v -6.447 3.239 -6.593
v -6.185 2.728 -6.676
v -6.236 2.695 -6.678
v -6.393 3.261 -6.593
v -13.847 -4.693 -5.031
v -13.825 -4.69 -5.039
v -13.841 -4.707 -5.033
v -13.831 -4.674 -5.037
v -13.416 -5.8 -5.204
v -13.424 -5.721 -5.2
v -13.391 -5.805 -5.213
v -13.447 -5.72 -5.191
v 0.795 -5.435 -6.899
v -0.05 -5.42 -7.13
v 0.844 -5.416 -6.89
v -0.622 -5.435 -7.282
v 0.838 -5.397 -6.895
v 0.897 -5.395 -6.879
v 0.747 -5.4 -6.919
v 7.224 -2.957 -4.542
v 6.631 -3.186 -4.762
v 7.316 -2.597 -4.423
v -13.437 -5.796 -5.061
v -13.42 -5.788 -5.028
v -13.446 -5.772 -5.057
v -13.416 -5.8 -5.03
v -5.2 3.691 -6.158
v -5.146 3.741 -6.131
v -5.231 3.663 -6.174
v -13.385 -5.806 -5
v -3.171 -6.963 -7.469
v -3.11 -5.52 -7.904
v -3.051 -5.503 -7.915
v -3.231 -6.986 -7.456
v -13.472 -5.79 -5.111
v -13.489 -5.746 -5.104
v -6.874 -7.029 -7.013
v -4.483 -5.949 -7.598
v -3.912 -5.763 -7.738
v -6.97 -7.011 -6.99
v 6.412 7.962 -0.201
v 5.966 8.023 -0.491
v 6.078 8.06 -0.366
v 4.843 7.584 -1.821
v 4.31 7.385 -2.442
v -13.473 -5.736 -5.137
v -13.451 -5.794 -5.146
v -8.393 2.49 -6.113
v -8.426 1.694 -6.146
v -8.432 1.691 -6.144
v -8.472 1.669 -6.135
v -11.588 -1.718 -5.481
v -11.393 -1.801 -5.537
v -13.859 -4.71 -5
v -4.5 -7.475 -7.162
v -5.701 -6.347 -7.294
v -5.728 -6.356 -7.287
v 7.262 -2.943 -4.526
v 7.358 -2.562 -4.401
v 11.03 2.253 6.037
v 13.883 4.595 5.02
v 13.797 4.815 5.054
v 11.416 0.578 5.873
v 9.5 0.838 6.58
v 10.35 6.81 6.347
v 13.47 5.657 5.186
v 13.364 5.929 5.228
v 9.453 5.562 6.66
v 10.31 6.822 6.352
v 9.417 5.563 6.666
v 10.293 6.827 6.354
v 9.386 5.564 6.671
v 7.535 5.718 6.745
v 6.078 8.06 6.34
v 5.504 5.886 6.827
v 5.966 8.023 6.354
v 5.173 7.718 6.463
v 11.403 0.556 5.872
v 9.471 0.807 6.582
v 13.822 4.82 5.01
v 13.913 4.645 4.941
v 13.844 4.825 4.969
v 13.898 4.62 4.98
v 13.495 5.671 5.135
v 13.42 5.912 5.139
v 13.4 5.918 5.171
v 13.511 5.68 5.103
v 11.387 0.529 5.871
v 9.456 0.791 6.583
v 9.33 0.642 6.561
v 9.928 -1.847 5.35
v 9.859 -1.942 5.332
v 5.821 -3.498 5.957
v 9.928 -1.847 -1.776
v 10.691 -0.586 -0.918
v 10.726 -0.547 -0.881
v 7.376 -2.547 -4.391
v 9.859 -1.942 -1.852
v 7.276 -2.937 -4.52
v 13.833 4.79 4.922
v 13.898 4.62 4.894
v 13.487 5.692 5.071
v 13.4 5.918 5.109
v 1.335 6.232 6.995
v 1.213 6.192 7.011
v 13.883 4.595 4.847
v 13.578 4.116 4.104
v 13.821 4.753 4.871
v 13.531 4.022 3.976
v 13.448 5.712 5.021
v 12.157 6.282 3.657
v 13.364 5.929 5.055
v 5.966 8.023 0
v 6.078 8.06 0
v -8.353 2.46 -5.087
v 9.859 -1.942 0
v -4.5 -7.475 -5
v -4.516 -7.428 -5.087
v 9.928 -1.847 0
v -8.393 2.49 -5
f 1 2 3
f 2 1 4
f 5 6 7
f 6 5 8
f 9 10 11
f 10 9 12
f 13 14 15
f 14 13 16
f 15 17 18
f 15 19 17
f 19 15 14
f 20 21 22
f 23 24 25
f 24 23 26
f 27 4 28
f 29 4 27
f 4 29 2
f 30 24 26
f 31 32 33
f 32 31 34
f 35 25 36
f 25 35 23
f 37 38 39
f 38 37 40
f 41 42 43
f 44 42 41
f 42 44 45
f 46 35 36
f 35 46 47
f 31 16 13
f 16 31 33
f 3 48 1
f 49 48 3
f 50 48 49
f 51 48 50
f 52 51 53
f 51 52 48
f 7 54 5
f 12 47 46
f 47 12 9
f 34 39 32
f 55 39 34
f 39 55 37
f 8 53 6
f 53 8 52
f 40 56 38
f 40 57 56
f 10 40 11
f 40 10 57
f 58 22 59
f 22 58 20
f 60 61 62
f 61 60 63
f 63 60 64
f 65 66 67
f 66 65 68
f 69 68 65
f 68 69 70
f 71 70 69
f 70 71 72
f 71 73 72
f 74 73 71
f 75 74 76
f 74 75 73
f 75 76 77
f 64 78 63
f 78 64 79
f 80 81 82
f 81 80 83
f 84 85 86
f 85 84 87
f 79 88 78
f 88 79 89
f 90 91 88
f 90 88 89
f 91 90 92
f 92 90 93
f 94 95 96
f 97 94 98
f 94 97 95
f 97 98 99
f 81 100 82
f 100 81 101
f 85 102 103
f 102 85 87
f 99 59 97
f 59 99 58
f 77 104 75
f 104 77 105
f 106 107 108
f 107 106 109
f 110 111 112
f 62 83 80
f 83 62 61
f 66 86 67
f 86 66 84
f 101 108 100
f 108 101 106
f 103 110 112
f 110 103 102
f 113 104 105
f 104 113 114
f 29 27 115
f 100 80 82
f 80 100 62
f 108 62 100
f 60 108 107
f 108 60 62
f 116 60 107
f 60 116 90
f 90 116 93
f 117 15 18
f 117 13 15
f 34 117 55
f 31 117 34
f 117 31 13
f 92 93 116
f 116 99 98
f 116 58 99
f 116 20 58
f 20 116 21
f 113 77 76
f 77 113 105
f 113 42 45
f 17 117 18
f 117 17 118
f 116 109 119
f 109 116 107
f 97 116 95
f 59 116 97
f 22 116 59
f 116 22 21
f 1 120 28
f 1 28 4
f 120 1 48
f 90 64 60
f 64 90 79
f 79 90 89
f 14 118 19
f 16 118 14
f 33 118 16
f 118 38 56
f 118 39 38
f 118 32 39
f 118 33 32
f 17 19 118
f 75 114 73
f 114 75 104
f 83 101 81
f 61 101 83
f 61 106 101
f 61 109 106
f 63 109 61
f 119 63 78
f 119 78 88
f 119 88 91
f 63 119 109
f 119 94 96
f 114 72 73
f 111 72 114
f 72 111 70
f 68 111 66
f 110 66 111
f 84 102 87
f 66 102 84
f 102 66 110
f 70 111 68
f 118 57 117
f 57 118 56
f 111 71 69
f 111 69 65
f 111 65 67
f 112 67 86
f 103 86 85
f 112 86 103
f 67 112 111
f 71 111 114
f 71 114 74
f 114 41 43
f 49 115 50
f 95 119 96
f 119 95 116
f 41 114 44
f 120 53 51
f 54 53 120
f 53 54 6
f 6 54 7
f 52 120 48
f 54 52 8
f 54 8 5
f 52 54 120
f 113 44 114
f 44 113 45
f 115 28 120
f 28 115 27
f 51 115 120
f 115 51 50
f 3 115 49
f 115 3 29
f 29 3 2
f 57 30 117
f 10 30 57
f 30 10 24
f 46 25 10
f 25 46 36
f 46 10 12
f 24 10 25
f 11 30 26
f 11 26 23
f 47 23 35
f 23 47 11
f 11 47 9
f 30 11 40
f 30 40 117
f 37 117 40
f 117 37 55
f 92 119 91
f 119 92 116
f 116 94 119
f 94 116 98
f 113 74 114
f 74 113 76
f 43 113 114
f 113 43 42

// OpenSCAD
// Auto-generated OpenSCAD file

    inner_points = 10*[[1.4359011870482463, 0.5533730837177137, -0.5000000000000805], [-1.4359011870482463, -0.5533730837177137, 0.5000000000000805], [0.8874357380822848, 0.34200337419673843, 1.3090169943748977], [1.483420692140161e-13, -1.4966410443445797e-13, 1.618033988749895], [-1.483420692140161e-13, 1.4966410443445797e-13, -1.618033988749895], [-0.8874357380822848, -0.34200337419673843, -1.3090169943748977], [1.4359011870483378, 0.5533730837176212, 0.4999999999999195], [-0.887435738082045, -0.3420033741969806, 1.3090169943749972], [0.887435738082045, 0.3420033741969806, -1.3090169943749972], [-1.4359011870483378, -0.5533730837176212, -0.4999999999999195], [0.05622638989055023, 0.5850898186537883, 0.8090169943749964], [0.434336020988879, -0.39603500310477363, 0.809016994374871], [0.6046918388566034, 0.7964595281746711, 1.8207657603852567e-14], [0.9828014699549321, -0.18466529358389083, -1.0721978860317449e-13], [-0.8312093481916429, 0.2430864444569574, 0.5000000000000987], [-0.45309971709331415, -0.7380383773016045, 0.49999999999997324], [0.05622638989040191, 0.5850898186539379, -0.8090169943748985], [0.4343360209887307, -0.3960350031046239, -0.809016994375024], [-0.8312093481917346, 0.24308644445704983, -0.4999999999999013], [-0.4530997170934058, -0.738038377301512, -0.5000000000000268]];

    outer_points = 10*[[-1.562151832989105, 0.0, -0.42156332791014234], [1.562151832989105, 0.0, 0.42156332791014234], [-0.5807729208038567, 1.4921233423461835, 0.23303376243906446], [0.3846900075713595, 1.4921233423461835, 0.4935742274980496], [-0.3846900075713595, -1.4921233423461835, -0.4935742274980496], [0.5807729208038567, -1.4921233423461835, -0.23303376243906446], [-1.3244003331775505, 0.9221829409770366, -0.11651767934537474], [1.2032144281867707, 0.9221829409770366, 0.5655861136237528], [-1.2032144281867707, -0.9221829409770366, -0.5655861136237528], [1.3244003331775505, -0.9221829409770366, 0.11651767934537474], [-0.18701174725268985, 0.6962659651294776, 0.692993731711776], [0.07861977866300407, 0.9533850298427866, -0.29133471347343615], [-0.9306391596263837, 0.12632556376033077, 0.34344228992733694], [-0.6650076337106898, 0.3834446284736398, -0.6408861552578753], [0.6315126733627214, 0.12632556376033077, 0.7650056178374792], [0.8971441992784153, 0.3834446284736398, -0.21932282734773292], [-0.5717017548240494, -0.7958573772167059, 0.19941950421372653], [-0.3060702289083555, -0.5387383125033969, -0.7849089409714857], [0.3937611735511668, -0.7958573772167059, 0.45995996927271166], [0.6593926994668606, -0.5387383125033969, -0.5243684759125006]];

    // Convex hull for inner set (I)
    module inner_hull() {
        hull() {
            for (p = inner_points) {
                translate(p) sphere(r=0.1);
            }
        }
    }

    // Convex hull for outer set (O) minus inner hull (O \ I)
    module outer_minus_inner() {
        difference() {
            hull() {
                for (p = outer_points) {
                    translate(p) sphere(r=0.1);
                }
            }
            inner_hull(); // Subtract inner hull
        }
    }

    // Convex hull for outer set (O) minus all translated inner hulls
    module outer_minus_AllTranslationInner() {
        difference() {
            hull() {
                for (p = outer_points) {
                    translate(p) sphere(r=0.1);
                }
            }
            hull() {
                translate([0,0,50]) inner_hull();
                translate([0,0,-50]) inner_hull();
            }; // Subtract translated inner hulls
        }
    }

    // Difference between outer_minus_inner and outer_minus_AllTranslationInner
    module outer_minus_inner_diff() {
        difference() {
            // Outer minus inner
            difference() {
                hull() {
                    for (p = outer_points) {
                        translate(p) sphere(r=0.1);
                    }
                }
                inner_hull();
            }

            // Subtract Outer minus AllTranslationInner
            difference() {
                hull() {
                    for (p = outer_points) {
                        translate(p) sphere(r=0.1);
                    }
                }
                hull() {
                    translate([0,0,50]) inner_hull();
                    translate([0,0,-50]) inner_hull();
                };
            }
        }
    }

    // Rendering all with colors applied
    color([1, 1, 0, 1]) outer_minus_inner_diff(); // Opaque yellow
    
